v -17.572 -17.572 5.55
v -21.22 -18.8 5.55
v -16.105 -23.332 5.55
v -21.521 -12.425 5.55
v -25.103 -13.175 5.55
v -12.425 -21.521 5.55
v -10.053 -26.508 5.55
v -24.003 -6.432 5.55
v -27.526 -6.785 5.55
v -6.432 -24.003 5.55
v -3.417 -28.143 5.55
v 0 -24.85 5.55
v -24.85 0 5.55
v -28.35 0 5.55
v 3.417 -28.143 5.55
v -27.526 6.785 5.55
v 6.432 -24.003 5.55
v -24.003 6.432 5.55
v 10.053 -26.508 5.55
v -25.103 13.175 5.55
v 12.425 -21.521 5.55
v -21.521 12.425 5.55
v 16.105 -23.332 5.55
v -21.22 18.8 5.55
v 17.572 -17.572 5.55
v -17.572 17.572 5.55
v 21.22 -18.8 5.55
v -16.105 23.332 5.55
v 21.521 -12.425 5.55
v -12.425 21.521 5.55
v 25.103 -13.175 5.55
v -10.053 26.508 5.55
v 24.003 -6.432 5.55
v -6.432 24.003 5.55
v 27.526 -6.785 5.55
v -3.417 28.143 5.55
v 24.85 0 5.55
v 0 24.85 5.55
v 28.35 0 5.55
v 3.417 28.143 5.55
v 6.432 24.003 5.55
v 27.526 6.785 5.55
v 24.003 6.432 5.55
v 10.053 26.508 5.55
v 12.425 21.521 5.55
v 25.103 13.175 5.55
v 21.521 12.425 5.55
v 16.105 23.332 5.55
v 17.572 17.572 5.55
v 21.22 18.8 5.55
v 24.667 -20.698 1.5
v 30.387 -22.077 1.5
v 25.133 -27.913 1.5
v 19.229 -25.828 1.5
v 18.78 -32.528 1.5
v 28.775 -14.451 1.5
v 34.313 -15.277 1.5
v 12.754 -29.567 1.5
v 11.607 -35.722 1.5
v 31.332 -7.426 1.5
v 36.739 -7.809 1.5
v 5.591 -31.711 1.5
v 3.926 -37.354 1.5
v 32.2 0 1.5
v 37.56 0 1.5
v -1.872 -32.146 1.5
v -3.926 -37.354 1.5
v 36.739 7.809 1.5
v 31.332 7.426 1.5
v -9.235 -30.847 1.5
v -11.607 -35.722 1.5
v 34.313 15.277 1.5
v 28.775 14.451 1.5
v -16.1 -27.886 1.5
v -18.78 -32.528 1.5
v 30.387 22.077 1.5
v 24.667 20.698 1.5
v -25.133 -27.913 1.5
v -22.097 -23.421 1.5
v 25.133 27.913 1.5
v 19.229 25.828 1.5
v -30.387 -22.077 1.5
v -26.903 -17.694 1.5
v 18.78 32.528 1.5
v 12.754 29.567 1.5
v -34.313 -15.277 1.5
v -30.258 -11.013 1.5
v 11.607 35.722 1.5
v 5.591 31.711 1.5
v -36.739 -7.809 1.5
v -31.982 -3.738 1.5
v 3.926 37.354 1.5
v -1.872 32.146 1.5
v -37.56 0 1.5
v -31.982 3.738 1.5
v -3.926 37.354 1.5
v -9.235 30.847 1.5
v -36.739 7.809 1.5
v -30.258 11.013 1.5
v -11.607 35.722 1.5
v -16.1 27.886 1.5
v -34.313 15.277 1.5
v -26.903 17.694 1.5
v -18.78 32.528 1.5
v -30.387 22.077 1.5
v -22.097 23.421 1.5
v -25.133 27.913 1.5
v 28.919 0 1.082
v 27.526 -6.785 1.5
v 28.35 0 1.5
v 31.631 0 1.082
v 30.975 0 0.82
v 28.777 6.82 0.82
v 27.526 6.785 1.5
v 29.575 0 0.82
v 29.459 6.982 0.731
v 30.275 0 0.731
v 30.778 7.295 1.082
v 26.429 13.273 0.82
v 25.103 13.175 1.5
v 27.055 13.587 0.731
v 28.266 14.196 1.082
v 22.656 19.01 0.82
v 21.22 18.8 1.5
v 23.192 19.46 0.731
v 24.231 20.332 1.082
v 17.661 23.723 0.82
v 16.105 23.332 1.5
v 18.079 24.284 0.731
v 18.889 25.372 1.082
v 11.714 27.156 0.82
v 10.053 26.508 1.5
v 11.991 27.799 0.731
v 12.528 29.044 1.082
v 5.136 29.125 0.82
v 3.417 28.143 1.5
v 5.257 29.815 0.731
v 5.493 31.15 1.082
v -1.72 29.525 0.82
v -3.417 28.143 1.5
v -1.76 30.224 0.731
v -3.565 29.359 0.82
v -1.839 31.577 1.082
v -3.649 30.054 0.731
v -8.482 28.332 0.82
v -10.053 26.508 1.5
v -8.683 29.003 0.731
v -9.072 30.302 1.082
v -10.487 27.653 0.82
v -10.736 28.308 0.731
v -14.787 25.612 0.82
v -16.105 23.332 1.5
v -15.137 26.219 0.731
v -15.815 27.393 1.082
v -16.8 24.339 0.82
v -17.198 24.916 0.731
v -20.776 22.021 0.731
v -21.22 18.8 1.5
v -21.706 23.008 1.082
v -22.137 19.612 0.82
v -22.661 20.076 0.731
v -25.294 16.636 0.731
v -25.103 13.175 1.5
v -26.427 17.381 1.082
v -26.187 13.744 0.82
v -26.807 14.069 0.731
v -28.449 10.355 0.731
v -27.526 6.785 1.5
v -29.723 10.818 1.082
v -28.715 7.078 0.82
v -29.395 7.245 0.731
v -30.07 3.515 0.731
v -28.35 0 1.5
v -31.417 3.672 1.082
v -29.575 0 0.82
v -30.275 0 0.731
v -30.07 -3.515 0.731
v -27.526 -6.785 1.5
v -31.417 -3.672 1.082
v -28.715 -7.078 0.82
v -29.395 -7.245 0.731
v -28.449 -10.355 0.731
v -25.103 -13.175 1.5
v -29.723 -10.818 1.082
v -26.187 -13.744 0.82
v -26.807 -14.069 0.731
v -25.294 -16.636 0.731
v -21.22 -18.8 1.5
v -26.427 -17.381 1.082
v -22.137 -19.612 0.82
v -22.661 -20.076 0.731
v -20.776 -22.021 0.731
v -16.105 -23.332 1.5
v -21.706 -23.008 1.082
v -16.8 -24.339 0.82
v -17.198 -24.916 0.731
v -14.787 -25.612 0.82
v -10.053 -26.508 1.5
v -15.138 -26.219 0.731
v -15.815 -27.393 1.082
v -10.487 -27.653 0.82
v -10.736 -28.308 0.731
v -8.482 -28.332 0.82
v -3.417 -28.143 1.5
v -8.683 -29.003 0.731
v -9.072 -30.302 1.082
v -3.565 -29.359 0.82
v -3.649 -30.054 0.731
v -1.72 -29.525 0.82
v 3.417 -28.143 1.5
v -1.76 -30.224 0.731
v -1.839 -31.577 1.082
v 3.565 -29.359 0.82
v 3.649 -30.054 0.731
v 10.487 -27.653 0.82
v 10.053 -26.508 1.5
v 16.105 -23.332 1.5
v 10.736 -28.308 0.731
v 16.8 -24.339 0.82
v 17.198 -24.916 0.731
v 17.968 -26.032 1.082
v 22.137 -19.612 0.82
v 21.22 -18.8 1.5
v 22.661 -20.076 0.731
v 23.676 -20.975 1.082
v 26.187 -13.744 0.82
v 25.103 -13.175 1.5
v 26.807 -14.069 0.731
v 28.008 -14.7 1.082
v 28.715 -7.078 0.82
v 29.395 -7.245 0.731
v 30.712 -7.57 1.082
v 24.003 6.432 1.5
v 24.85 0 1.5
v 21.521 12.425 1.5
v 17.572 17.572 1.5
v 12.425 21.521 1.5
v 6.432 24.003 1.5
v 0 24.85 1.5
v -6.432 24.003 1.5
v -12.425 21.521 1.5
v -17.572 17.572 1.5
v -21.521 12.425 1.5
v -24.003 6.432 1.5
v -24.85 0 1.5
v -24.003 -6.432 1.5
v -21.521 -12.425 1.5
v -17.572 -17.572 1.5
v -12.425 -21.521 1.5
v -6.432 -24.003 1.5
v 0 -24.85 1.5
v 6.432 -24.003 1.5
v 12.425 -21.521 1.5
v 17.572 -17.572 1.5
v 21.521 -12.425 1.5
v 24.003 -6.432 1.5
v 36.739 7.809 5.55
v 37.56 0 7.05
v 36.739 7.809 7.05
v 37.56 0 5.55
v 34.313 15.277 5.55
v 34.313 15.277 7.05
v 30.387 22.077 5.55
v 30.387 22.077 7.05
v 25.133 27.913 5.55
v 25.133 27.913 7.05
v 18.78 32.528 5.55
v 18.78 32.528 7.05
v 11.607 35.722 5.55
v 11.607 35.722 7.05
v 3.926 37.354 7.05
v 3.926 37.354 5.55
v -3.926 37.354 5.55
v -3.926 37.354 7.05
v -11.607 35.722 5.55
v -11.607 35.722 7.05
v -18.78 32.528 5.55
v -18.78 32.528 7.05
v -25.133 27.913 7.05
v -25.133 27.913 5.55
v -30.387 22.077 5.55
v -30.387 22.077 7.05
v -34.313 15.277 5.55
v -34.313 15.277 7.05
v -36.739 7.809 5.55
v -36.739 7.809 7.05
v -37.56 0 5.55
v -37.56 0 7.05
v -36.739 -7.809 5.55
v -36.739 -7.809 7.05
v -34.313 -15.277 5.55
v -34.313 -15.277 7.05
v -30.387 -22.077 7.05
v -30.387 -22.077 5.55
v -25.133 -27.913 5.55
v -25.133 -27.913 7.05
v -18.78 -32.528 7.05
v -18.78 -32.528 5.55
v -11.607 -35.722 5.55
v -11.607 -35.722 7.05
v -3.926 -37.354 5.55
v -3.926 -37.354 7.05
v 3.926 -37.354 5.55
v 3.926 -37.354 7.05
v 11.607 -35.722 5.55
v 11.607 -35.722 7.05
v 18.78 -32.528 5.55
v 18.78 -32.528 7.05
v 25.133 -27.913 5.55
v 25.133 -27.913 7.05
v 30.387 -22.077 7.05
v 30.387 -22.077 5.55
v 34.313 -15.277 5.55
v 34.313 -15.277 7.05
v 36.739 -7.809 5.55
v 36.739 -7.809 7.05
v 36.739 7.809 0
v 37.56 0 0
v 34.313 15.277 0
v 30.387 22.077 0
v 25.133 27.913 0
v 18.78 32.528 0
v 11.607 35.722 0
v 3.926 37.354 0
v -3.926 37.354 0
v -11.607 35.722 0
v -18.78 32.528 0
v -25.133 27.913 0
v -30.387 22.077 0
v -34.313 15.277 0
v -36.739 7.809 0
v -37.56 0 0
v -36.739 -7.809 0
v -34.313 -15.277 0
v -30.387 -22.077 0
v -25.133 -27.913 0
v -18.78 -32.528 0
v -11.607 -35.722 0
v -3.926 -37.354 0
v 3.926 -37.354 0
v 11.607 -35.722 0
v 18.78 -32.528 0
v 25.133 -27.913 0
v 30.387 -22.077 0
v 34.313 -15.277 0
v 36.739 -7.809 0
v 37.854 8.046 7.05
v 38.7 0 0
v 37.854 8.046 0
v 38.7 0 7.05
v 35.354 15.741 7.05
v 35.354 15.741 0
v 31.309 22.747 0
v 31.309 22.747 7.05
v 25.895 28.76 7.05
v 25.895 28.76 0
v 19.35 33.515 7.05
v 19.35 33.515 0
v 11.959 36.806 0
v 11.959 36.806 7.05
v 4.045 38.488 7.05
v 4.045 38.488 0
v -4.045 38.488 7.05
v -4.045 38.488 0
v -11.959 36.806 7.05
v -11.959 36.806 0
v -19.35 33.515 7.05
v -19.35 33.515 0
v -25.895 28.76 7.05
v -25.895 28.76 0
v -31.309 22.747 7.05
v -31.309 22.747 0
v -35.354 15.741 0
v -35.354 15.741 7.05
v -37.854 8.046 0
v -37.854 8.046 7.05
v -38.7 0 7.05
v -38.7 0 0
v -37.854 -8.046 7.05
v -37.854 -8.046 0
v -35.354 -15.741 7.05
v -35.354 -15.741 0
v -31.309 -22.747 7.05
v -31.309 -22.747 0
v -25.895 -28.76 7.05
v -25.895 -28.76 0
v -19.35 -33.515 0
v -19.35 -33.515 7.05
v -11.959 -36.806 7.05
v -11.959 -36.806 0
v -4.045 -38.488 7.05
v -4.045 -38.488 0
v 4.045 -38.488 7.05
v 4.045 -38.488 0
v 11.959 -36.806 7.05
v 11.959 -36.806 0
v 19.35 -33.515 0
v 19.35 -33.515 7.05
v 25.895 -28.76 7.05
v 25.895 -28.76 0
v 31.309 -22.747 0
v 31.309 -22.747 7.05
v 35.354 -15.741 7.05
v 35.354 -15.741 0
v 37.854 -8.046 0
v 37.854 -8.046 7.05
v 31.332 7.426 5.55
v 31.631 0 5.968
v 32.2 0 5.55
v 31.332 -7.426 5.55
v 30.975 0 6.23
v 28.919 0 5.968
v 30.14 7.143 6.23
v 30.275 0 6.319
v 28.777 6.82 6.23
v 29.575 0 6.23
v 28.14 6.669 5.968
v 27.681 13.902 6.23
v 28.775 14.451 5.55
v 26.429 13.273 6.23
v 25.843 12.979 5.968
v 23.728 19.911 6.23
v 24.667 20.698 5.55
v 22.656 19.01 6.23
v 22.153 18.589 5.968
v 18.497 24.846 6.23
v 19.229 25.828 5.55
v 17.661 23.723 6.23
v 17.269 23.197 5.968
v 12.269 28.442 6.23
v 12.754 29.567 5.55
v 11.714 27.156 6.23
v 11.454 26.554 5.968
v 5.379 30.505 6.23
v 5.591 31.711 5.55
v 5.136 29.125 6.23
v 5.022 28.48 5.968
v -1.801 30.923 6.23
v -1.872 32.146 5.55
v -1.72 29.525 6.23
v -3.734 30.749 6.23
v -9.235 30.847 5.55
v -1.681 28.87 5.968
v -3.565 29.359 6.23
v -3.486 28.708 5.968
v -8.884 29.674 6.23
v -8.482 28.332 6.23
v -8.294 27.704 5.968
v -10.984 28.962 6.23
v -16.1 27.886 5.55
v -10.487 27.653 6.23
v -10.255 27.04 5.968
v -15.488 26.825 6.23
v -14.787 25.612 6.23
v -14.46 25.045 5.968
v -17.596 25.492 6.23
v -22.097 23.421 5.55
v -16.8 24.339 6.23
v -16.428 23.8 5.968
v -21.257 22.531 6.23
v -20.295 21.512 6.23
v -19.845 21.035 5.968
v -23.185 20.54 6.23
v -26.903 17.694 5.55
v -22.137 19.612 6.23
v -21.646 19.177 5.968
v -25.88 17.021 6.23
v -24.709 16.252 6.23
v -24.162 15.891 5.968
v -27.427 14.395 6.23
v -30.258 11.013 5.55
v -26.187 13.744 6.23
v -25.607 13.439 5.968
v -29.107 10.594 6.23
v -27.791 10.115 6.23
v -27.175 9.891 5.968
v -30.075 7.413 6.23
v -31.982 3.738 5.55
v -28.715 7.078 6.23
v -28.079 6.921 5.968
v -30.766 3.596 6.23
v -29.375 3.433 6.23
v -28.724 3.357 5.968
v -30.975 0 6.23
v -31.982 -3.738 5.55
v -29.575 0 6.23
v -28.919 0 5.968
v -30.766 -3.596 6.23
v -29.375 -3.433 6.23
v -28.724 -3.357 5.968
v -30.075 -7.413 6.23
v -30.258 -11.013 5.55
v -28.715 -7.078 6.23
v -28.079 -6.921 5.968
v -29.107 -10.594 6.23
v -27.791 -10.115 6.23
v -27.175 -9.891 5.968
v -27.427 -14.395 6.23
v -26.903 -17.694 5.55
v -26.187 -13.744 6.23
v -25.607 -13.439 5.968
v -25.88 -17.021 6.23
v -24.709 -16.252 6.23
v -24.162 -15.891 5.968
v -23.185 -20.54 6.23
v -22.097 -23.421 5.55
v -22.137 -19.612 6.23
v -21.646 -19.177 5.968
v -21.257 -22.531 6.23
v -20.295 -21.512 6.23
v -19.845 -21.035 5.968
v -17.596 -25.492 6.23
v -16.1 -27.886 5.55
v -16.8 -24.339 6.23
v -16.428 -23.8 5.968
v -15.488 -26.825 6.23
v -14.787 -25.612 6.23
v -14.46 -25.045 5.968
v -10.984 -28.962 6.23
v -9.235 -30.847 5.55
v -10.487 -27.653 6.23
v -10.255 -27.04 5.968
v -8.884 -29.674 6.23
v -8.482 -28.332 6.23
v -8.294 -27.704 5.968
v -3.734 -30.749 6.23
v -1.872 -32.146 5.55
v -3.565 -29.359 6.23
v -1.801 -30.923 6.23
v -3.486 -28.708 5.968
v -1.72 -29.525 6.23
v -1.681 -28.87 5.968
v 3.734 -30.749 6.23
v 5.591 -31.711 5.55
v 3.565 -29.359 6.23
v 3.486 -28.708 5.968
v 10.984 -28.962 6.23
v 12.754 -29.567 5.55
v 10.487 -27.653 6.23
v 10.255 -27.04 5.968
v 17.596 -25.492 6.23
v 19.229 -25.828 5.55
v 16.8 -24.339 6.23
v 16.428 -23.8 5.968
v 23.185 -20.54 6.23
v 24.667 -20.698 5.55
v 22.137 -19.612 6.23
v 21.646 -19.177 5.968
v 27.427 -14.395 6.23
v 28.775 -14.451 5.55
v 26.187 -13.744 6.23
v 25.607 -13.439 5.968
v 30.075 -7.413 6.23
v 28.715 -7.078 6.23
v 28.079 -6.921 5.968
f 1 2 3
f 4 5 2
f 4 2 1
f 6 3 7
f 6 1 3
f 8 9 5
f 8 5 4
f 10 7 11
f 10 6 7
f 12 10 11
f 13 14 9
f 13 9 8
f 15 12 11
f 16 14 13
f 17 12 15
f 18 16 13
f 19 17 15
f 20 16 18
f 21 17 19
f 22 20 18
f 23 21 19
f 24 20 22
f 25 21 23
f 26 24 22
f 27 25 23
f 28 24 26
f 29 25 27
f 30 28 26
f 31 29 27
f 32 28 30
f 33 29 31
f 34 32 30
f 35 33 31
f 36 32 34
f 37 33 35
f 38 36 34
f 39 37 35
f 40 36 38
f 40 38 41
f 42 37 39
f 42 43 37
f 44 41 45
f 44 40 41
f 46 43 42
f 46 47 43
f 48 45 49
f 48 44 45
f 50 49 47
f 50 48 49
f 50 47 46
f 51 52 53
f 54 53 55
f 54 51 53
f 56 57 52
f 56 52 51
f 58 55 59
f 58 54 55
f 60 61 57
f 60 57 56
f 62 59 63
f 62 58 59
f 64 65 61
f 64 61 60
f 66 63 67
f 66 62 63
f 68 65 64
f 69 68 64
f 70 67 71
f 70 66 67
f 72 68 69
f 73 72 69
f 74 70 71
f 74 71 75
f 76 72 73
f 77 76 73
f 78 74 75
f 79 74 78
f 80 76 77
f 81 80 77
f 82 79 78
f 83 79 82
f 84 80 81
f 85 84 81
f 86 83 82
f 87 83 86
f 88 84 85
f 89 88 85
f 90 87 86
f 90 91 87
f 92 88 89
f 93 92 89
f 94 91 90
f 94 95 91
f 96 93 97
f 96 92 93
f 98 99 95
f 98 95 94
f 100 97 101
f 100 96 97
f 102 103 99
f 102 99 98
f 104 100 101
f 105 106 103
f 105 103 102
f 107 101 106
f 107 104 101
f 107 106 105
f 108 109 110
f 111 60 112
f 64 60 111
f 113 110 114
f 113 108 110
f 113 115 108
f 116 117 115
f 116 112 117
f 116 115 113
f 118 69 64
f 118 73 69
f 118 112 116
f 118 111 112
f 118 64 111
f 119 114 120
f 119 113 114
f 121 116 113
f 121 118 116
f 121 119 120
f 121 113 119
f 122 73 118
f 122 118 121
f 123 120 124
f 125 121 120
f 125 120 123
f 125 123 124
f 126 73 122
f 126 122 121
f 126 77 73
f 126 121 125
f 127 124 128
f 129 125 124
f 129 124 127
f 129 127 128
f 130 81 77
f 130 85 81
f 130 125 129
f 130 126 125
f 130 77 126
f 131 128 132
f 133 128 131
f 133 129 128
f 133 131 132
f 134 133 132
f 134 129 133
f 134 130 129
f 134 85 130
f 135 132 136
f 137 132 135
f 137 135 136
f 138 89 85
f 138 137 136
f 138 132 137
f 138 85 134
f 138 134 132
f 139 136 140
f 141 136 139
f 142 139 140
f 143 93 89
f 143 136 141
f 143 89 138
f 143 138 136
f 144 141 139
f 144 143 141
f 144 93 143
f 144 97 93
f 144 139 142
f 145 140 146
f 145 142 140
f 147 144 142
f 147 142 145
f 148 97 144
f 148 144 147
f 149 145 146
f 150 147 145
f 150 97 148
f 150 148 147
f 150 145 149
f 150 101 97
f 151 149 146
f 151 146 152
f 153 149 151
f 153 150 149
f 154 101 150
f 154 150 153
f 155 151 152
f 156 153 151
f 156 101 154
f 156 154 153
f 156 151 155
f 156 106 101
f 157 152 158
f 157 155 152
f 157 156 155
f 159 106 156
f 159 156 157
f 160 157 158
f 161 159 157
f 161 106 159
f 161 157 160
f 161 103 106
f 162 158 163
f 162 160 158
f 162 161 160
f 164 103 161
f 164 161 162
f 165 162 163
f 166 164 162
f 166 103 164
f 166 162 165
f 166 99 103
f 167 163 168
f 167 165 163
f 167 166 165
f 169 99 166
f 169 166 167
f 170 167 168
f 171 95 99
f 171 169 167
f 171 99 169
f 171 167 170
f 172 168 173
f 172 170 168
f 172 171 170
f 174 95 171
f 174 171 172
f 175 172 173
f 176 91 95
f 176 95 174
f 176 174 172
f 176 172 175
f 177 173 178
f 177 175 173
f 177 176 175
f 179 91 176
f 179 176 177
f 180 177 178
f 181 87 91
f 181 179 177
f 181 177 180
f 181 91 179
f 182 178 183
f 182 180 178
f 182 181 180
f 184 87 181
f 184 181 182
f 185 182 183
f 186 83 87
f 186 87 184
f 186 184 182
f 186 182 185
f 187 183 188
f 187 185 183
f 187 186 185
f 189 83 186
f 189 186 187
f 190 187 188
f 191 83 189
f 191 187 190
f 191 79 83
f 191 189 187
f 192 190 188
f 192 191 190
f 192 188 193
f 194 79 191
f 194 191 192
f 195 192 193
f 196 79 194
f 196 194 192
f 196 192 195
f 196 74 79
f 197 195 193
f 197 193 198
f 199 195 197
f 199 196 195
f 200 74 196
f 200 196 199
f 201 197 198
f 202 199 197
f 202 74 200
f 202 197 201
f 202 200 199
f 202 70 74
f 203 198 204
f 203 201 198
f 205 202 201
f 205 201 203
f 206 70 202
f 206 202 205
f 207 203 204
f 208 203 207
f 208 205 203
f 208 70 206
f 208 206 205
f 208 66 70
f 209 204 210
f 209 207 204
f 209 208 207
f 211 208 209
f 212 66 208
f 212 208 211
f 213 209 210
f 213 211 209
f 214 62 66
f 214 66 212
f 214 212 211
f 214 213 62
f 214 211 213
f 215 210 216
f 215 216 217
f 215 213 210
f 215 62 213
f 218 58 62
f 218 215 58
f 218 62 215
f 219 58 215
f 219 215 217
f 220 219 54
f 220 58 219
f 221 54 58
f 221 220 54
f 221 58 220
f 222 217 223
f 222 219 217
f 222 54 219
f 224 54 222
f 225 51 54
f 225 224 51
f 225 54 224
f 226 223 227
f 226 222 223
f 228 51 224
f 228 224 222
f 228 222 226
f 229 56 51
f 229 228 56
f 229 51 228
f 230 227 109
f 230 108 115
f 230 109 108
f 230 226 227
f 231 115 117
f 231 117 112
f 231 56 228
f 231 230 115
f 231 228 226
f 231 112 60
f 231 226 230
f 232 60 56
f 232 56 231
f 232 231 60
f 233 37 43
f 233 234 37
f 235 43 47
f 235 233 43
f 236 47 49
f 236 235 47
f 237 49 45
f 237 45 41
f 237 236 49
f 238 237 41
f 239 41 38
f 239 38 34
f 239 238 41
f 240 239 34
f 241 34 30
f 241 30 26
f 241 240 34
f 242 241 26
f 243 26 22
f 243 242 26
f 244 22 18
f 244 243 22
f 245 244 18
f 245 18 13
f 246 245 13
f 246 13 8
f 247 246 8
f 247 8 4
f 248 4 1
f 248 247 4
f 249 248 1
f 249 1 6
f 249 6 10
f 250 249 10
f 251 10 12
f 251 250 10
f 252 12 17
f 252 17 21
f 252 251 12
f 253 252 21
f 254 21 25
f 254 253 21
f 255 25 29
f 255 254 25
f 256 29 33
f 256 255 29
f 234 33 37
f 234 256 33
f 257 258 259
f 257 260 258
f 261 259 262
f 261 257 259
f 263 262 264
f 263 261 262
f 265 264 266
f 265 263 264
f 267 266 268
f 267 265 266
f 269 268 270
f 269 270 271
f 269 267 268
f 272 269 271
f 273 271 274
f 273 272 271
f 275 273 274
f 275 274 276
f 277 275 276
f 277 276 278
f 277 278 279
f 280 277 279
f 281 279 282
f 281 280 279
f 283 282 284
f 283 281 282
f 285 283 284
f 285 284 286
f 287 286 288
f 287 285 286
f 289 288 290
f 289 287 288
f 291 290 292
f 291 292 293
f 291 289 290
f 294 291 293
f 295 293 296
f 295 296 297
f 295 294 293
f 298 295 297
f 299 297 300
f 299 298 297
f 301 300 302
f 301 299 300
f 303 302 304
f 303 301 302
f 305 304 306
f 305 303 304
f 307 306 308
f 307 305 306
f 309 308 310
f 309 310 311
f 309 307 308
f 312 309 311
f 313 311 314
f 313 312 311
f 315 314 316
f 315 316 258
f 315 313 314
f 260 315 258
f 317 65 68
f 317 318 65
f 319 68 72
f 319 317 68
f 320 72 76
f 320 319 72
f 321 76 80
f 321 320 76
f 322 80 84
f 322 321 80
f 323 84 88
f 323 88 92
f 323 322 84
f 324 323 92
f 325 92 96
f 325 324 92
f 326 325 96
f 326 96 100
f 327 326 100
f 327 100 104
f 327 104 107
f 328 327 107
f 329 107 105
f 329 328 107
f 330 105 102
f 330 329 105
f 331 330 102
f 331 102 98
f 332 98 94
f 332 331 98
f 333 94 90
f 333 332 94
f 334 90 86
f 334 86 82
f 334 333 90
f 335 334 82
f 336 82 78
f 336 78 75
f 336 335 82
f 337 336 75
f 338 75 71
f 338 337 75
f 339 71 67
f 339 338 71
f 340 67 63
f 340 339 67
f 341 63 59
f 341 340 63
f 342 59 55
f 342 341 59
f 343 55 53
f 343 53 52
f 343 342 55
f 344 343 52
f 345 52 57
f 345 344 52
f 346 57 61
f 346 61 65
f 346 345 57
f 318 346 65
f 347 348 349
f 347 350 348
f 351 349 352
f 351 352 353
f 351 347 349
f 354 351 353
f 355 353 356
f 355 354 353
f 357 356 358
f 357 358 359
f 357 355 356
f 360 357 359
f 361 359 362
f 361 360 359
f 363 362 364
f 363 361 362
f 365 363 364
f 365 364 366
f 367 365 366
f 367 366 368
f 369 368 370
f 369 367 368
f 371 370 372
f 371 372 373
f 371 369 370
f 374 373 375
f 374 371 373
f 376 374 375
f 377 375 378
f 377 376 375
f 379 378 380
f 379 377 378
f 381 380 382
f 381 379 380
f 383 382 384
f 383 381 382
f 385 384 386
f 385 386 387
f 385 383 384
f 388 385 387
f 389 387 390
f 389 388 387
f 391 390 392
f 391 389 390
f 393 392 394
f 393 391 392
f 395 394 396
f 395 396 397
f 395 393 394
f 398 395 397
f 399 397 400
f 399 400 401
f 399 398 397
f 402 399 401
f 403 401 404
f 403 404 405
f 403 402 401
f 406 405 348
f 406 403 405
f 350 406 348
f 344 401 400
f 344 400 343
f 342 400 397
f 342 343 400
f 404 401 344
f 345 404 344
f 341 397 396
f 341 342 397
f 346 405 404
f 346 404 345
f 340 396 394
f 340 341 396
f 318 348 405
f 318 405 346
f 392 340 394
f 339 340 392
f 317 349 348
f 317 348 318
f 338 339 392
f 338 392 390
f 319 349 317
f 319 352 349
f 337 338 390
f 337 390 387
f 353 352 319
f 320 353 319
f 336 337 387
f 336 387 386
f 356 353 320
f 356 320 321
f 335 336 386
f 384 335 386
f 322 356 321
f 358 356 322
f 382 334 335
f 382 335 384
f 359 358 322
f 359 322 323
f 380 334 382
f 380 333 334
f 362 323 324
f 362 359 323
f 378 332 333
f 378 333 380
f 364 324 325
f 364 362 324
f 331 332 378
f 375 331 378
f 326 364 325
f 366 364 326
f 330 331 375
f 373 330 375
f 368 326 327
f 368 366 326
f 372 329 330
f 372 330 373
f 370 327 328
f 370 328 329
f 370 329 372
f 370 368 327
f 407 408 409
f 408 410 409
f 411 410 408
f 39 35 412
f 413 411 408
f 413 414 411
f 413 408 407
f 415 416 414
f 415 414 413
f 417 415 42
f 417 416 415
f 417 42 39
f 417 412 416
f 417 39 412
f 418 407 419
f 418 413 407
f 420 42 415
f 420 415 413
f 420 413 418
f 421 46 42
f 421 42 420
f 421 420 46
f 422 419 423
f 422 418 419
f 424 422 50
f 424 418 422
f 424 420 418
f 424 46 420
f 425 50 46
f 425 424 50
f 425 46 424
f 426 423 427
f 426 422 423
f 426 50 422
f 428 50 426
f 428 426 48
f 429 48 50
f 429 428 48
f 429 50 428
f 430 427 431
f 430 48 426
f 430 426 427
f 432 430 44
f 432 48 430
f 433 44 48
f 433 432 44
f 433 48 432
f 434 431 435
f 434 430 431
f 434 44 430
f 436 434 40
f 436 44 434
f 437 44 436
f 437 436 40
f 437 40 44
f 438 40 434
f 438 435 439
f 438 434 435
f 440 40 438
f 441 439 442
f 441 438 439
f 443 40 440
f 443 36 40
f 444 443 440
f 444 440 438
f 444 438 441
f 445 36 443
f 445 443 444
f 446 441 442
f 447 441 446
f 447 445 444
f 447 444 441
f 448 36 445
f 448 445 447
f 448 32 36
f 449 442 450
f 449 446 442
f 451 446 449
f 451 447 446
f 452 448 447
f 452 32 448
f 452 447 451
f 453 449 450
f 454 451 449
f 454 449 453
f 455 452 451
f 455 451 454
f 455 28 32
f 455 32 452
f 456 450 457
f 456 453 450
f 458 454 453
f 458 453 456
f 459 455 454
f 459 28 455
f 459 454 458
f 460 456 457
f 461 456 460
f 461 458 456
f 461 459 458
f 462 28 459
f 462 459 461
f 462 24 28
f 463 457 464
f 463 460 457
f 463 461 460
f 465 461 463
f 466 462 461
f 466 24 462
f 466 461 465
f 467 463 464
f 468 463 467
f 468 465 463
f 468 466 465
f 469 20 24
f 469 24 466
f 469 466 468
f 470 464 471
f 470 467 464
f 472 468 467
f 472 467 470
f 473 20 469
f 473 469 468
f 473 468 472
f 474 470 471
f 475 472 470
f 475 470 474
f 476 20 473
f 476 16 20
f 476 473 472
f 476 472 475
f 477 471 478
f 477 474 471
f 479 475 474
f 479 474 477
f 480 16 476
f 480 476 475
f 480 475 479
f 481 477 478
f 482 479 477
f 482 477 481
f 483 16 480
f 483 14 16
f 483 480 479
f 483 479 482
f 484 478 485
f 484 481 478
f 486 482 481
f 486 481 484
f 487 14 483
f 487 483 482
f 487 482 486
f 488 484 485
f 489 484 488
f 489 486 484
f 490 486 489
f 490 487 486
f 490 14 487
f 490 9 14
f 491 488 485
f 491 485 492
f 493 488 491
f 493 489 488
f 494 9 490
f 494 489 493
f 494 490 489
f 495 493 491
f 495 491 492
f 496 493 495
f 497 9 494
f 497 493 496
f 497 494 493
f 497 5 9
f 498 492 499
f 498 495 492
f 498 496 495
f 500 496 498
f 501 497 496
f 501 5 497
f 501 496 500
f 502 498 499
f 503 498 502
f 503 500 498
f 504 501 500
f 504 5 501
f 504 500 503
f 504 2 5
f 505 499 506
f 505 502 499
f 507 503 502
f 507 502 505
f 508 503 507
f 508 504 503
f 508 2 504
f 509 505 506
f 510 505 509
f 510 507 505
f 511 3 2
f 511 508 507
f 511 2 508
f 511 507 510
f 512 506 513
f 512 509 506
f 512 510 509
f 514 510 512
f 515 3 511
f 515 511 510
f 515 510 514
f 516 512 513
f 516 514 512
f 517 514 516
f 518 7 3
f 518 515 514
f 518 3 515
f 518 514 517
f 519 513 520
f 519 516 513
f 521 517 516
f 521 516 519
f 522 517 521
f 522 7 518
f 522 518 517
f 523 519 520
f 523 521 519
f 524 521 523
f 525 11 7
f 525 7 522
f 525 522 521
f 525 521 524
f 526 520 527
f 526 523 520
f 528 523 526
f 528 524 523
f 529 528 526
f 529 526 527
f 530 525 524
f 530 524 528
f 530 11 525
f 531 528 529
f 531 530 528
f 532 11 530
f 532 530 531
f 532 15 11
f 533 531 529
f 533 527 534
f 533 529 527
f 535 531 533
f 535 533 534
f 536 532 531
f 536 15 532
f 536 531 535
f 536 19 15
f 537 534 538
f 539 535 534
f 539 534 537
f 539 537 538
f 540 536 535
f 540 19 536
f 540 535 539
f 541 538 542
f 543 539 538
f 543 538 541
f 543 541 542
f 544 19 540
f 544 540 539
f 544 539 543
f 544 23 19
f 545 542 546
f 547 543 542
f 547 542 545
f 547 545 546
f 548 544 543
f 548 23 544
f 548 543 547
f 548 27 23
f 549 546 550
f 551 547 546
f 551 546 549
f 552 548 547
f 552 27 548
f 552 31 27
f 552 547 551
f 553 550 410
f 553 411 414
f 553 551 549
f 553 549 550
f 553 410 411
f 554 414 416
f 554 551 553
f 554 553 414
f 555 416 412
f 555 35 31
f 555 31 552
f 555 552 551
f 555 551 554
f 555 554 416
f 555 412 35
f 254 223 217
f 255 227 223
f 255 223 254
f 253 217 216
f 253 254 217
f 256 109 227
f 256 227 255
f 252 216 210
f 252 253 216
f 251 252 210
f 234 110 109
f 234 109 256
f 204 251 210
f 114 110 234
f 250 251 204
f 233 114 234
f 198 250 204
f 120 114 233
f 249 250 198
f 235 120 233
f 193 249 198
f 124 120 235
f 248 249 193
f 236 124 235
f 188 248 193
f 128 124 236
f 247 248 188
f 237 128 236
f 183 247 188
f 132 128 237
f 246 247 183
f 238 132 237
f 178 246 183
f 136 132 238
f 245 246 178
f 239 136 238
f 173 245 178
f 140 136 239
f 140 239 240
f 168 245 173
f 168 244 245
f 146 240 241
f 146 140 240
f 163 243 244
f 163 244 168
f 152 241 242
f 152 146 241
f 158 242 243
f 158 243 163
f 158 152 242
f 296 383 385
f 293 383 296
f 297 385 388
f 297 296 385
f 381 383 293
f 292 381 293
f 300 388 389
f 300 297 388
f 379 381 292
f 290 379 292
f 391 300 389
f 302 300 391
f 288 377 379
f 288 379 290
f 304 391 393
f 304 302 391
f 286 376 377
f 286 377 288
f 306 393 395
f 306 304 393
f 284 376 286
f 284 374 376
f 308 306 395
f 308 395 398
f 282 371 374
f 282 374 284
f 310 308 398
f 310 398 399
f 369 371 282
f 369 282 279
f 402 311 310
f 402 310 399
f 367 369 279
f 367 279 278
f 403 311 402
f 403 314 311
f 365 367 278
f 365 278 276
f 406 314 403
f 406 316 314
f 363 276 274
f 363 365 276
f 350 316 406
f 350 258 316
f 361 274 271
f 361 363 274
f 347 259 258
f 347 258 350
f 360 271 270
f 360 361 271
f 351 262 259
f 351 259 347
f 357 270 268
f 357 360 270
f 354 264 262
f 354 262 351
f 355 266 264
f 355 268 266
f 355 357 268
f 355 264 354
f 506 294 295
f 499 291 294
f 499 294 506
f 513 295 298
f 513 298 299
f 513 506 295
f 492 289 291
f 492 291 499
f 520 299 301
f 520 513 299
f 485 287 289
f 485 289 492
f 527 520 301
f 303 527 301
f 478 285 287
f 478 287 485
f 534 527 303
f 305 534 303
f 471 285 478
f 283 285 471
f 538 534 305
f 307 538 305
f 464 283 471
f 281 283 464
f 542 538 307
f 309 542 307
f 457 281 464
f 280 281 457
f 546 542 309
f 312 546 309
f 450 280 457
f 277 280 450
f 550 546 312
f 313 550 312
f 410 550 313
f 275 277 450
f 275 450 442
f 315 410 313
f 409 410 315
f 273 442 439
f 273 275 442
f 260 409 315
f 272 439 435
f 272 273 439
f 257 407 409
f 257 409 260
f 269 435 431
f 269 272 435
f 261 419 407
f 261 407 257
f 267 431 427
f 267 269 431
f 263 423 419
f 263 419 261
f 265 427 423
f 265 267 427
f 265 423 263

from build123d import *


with BuildPart() as f1:
    # F0 (on Front) → F1 (revolve)
    with BuildSketch(Plane.XZ):
        with BuildLine():
            Line((24.85, 1.5), (28.35, 1.5))
            ThreePointArc((28.35, 1.5), (27.481033, 3.525), (28.35, 5.55))
            Line((28.35, 5.55), (24.85, 5.55))
            Line((24.85, 5.55), (24.85, 1.5))
        make_face()
        with BuildLine():
            Line((37.56, 0), (38.7, 0))
            Line((38.7, 0), (38.7, 7.05))
            Line((38.7, 7.05), (37.56, 7.05))
            Line((37.56, 7.05), (37.56, 5.55))
            Line((37.56, 5.55), (32.2, 5.55))
            ThreePointArc((32.2, 5.55), (32.842551, 4.626786), (33.068967, 3.525))
            ThreePointArc((33.068967, 3.525), (32.842551, 2.423214), (32.2, 1.5))
            Line((32.2, 1.5), (37.56, 1.5))
            Line((37.56, 1.5), (37.56, 0))
        make_face()
        with BuildLine():
            ThreePointArc((28.35, 1.5), (30.275, 0.731033), (32.2, 1.5))
            ThreePointArc((32.2, 1.5), (32.842551, 2.423214), (33.068967, 3.525))
            ThreePointArc((33.068967, 3.525), (32.842551, 4.626786), (32.2, 5.55))
            ThreePointArc((32.2, 5.55), (30.275, 6.318967), (28.35, 5.55))
            ThreePointArc((28.35, 5.55), (27.481033, 3.525), (28.35, 1.5))
        make_face()
    revolve(axis=Axis((0, 0, 3.525), (0, 0, 1)))


solid = f1.part
